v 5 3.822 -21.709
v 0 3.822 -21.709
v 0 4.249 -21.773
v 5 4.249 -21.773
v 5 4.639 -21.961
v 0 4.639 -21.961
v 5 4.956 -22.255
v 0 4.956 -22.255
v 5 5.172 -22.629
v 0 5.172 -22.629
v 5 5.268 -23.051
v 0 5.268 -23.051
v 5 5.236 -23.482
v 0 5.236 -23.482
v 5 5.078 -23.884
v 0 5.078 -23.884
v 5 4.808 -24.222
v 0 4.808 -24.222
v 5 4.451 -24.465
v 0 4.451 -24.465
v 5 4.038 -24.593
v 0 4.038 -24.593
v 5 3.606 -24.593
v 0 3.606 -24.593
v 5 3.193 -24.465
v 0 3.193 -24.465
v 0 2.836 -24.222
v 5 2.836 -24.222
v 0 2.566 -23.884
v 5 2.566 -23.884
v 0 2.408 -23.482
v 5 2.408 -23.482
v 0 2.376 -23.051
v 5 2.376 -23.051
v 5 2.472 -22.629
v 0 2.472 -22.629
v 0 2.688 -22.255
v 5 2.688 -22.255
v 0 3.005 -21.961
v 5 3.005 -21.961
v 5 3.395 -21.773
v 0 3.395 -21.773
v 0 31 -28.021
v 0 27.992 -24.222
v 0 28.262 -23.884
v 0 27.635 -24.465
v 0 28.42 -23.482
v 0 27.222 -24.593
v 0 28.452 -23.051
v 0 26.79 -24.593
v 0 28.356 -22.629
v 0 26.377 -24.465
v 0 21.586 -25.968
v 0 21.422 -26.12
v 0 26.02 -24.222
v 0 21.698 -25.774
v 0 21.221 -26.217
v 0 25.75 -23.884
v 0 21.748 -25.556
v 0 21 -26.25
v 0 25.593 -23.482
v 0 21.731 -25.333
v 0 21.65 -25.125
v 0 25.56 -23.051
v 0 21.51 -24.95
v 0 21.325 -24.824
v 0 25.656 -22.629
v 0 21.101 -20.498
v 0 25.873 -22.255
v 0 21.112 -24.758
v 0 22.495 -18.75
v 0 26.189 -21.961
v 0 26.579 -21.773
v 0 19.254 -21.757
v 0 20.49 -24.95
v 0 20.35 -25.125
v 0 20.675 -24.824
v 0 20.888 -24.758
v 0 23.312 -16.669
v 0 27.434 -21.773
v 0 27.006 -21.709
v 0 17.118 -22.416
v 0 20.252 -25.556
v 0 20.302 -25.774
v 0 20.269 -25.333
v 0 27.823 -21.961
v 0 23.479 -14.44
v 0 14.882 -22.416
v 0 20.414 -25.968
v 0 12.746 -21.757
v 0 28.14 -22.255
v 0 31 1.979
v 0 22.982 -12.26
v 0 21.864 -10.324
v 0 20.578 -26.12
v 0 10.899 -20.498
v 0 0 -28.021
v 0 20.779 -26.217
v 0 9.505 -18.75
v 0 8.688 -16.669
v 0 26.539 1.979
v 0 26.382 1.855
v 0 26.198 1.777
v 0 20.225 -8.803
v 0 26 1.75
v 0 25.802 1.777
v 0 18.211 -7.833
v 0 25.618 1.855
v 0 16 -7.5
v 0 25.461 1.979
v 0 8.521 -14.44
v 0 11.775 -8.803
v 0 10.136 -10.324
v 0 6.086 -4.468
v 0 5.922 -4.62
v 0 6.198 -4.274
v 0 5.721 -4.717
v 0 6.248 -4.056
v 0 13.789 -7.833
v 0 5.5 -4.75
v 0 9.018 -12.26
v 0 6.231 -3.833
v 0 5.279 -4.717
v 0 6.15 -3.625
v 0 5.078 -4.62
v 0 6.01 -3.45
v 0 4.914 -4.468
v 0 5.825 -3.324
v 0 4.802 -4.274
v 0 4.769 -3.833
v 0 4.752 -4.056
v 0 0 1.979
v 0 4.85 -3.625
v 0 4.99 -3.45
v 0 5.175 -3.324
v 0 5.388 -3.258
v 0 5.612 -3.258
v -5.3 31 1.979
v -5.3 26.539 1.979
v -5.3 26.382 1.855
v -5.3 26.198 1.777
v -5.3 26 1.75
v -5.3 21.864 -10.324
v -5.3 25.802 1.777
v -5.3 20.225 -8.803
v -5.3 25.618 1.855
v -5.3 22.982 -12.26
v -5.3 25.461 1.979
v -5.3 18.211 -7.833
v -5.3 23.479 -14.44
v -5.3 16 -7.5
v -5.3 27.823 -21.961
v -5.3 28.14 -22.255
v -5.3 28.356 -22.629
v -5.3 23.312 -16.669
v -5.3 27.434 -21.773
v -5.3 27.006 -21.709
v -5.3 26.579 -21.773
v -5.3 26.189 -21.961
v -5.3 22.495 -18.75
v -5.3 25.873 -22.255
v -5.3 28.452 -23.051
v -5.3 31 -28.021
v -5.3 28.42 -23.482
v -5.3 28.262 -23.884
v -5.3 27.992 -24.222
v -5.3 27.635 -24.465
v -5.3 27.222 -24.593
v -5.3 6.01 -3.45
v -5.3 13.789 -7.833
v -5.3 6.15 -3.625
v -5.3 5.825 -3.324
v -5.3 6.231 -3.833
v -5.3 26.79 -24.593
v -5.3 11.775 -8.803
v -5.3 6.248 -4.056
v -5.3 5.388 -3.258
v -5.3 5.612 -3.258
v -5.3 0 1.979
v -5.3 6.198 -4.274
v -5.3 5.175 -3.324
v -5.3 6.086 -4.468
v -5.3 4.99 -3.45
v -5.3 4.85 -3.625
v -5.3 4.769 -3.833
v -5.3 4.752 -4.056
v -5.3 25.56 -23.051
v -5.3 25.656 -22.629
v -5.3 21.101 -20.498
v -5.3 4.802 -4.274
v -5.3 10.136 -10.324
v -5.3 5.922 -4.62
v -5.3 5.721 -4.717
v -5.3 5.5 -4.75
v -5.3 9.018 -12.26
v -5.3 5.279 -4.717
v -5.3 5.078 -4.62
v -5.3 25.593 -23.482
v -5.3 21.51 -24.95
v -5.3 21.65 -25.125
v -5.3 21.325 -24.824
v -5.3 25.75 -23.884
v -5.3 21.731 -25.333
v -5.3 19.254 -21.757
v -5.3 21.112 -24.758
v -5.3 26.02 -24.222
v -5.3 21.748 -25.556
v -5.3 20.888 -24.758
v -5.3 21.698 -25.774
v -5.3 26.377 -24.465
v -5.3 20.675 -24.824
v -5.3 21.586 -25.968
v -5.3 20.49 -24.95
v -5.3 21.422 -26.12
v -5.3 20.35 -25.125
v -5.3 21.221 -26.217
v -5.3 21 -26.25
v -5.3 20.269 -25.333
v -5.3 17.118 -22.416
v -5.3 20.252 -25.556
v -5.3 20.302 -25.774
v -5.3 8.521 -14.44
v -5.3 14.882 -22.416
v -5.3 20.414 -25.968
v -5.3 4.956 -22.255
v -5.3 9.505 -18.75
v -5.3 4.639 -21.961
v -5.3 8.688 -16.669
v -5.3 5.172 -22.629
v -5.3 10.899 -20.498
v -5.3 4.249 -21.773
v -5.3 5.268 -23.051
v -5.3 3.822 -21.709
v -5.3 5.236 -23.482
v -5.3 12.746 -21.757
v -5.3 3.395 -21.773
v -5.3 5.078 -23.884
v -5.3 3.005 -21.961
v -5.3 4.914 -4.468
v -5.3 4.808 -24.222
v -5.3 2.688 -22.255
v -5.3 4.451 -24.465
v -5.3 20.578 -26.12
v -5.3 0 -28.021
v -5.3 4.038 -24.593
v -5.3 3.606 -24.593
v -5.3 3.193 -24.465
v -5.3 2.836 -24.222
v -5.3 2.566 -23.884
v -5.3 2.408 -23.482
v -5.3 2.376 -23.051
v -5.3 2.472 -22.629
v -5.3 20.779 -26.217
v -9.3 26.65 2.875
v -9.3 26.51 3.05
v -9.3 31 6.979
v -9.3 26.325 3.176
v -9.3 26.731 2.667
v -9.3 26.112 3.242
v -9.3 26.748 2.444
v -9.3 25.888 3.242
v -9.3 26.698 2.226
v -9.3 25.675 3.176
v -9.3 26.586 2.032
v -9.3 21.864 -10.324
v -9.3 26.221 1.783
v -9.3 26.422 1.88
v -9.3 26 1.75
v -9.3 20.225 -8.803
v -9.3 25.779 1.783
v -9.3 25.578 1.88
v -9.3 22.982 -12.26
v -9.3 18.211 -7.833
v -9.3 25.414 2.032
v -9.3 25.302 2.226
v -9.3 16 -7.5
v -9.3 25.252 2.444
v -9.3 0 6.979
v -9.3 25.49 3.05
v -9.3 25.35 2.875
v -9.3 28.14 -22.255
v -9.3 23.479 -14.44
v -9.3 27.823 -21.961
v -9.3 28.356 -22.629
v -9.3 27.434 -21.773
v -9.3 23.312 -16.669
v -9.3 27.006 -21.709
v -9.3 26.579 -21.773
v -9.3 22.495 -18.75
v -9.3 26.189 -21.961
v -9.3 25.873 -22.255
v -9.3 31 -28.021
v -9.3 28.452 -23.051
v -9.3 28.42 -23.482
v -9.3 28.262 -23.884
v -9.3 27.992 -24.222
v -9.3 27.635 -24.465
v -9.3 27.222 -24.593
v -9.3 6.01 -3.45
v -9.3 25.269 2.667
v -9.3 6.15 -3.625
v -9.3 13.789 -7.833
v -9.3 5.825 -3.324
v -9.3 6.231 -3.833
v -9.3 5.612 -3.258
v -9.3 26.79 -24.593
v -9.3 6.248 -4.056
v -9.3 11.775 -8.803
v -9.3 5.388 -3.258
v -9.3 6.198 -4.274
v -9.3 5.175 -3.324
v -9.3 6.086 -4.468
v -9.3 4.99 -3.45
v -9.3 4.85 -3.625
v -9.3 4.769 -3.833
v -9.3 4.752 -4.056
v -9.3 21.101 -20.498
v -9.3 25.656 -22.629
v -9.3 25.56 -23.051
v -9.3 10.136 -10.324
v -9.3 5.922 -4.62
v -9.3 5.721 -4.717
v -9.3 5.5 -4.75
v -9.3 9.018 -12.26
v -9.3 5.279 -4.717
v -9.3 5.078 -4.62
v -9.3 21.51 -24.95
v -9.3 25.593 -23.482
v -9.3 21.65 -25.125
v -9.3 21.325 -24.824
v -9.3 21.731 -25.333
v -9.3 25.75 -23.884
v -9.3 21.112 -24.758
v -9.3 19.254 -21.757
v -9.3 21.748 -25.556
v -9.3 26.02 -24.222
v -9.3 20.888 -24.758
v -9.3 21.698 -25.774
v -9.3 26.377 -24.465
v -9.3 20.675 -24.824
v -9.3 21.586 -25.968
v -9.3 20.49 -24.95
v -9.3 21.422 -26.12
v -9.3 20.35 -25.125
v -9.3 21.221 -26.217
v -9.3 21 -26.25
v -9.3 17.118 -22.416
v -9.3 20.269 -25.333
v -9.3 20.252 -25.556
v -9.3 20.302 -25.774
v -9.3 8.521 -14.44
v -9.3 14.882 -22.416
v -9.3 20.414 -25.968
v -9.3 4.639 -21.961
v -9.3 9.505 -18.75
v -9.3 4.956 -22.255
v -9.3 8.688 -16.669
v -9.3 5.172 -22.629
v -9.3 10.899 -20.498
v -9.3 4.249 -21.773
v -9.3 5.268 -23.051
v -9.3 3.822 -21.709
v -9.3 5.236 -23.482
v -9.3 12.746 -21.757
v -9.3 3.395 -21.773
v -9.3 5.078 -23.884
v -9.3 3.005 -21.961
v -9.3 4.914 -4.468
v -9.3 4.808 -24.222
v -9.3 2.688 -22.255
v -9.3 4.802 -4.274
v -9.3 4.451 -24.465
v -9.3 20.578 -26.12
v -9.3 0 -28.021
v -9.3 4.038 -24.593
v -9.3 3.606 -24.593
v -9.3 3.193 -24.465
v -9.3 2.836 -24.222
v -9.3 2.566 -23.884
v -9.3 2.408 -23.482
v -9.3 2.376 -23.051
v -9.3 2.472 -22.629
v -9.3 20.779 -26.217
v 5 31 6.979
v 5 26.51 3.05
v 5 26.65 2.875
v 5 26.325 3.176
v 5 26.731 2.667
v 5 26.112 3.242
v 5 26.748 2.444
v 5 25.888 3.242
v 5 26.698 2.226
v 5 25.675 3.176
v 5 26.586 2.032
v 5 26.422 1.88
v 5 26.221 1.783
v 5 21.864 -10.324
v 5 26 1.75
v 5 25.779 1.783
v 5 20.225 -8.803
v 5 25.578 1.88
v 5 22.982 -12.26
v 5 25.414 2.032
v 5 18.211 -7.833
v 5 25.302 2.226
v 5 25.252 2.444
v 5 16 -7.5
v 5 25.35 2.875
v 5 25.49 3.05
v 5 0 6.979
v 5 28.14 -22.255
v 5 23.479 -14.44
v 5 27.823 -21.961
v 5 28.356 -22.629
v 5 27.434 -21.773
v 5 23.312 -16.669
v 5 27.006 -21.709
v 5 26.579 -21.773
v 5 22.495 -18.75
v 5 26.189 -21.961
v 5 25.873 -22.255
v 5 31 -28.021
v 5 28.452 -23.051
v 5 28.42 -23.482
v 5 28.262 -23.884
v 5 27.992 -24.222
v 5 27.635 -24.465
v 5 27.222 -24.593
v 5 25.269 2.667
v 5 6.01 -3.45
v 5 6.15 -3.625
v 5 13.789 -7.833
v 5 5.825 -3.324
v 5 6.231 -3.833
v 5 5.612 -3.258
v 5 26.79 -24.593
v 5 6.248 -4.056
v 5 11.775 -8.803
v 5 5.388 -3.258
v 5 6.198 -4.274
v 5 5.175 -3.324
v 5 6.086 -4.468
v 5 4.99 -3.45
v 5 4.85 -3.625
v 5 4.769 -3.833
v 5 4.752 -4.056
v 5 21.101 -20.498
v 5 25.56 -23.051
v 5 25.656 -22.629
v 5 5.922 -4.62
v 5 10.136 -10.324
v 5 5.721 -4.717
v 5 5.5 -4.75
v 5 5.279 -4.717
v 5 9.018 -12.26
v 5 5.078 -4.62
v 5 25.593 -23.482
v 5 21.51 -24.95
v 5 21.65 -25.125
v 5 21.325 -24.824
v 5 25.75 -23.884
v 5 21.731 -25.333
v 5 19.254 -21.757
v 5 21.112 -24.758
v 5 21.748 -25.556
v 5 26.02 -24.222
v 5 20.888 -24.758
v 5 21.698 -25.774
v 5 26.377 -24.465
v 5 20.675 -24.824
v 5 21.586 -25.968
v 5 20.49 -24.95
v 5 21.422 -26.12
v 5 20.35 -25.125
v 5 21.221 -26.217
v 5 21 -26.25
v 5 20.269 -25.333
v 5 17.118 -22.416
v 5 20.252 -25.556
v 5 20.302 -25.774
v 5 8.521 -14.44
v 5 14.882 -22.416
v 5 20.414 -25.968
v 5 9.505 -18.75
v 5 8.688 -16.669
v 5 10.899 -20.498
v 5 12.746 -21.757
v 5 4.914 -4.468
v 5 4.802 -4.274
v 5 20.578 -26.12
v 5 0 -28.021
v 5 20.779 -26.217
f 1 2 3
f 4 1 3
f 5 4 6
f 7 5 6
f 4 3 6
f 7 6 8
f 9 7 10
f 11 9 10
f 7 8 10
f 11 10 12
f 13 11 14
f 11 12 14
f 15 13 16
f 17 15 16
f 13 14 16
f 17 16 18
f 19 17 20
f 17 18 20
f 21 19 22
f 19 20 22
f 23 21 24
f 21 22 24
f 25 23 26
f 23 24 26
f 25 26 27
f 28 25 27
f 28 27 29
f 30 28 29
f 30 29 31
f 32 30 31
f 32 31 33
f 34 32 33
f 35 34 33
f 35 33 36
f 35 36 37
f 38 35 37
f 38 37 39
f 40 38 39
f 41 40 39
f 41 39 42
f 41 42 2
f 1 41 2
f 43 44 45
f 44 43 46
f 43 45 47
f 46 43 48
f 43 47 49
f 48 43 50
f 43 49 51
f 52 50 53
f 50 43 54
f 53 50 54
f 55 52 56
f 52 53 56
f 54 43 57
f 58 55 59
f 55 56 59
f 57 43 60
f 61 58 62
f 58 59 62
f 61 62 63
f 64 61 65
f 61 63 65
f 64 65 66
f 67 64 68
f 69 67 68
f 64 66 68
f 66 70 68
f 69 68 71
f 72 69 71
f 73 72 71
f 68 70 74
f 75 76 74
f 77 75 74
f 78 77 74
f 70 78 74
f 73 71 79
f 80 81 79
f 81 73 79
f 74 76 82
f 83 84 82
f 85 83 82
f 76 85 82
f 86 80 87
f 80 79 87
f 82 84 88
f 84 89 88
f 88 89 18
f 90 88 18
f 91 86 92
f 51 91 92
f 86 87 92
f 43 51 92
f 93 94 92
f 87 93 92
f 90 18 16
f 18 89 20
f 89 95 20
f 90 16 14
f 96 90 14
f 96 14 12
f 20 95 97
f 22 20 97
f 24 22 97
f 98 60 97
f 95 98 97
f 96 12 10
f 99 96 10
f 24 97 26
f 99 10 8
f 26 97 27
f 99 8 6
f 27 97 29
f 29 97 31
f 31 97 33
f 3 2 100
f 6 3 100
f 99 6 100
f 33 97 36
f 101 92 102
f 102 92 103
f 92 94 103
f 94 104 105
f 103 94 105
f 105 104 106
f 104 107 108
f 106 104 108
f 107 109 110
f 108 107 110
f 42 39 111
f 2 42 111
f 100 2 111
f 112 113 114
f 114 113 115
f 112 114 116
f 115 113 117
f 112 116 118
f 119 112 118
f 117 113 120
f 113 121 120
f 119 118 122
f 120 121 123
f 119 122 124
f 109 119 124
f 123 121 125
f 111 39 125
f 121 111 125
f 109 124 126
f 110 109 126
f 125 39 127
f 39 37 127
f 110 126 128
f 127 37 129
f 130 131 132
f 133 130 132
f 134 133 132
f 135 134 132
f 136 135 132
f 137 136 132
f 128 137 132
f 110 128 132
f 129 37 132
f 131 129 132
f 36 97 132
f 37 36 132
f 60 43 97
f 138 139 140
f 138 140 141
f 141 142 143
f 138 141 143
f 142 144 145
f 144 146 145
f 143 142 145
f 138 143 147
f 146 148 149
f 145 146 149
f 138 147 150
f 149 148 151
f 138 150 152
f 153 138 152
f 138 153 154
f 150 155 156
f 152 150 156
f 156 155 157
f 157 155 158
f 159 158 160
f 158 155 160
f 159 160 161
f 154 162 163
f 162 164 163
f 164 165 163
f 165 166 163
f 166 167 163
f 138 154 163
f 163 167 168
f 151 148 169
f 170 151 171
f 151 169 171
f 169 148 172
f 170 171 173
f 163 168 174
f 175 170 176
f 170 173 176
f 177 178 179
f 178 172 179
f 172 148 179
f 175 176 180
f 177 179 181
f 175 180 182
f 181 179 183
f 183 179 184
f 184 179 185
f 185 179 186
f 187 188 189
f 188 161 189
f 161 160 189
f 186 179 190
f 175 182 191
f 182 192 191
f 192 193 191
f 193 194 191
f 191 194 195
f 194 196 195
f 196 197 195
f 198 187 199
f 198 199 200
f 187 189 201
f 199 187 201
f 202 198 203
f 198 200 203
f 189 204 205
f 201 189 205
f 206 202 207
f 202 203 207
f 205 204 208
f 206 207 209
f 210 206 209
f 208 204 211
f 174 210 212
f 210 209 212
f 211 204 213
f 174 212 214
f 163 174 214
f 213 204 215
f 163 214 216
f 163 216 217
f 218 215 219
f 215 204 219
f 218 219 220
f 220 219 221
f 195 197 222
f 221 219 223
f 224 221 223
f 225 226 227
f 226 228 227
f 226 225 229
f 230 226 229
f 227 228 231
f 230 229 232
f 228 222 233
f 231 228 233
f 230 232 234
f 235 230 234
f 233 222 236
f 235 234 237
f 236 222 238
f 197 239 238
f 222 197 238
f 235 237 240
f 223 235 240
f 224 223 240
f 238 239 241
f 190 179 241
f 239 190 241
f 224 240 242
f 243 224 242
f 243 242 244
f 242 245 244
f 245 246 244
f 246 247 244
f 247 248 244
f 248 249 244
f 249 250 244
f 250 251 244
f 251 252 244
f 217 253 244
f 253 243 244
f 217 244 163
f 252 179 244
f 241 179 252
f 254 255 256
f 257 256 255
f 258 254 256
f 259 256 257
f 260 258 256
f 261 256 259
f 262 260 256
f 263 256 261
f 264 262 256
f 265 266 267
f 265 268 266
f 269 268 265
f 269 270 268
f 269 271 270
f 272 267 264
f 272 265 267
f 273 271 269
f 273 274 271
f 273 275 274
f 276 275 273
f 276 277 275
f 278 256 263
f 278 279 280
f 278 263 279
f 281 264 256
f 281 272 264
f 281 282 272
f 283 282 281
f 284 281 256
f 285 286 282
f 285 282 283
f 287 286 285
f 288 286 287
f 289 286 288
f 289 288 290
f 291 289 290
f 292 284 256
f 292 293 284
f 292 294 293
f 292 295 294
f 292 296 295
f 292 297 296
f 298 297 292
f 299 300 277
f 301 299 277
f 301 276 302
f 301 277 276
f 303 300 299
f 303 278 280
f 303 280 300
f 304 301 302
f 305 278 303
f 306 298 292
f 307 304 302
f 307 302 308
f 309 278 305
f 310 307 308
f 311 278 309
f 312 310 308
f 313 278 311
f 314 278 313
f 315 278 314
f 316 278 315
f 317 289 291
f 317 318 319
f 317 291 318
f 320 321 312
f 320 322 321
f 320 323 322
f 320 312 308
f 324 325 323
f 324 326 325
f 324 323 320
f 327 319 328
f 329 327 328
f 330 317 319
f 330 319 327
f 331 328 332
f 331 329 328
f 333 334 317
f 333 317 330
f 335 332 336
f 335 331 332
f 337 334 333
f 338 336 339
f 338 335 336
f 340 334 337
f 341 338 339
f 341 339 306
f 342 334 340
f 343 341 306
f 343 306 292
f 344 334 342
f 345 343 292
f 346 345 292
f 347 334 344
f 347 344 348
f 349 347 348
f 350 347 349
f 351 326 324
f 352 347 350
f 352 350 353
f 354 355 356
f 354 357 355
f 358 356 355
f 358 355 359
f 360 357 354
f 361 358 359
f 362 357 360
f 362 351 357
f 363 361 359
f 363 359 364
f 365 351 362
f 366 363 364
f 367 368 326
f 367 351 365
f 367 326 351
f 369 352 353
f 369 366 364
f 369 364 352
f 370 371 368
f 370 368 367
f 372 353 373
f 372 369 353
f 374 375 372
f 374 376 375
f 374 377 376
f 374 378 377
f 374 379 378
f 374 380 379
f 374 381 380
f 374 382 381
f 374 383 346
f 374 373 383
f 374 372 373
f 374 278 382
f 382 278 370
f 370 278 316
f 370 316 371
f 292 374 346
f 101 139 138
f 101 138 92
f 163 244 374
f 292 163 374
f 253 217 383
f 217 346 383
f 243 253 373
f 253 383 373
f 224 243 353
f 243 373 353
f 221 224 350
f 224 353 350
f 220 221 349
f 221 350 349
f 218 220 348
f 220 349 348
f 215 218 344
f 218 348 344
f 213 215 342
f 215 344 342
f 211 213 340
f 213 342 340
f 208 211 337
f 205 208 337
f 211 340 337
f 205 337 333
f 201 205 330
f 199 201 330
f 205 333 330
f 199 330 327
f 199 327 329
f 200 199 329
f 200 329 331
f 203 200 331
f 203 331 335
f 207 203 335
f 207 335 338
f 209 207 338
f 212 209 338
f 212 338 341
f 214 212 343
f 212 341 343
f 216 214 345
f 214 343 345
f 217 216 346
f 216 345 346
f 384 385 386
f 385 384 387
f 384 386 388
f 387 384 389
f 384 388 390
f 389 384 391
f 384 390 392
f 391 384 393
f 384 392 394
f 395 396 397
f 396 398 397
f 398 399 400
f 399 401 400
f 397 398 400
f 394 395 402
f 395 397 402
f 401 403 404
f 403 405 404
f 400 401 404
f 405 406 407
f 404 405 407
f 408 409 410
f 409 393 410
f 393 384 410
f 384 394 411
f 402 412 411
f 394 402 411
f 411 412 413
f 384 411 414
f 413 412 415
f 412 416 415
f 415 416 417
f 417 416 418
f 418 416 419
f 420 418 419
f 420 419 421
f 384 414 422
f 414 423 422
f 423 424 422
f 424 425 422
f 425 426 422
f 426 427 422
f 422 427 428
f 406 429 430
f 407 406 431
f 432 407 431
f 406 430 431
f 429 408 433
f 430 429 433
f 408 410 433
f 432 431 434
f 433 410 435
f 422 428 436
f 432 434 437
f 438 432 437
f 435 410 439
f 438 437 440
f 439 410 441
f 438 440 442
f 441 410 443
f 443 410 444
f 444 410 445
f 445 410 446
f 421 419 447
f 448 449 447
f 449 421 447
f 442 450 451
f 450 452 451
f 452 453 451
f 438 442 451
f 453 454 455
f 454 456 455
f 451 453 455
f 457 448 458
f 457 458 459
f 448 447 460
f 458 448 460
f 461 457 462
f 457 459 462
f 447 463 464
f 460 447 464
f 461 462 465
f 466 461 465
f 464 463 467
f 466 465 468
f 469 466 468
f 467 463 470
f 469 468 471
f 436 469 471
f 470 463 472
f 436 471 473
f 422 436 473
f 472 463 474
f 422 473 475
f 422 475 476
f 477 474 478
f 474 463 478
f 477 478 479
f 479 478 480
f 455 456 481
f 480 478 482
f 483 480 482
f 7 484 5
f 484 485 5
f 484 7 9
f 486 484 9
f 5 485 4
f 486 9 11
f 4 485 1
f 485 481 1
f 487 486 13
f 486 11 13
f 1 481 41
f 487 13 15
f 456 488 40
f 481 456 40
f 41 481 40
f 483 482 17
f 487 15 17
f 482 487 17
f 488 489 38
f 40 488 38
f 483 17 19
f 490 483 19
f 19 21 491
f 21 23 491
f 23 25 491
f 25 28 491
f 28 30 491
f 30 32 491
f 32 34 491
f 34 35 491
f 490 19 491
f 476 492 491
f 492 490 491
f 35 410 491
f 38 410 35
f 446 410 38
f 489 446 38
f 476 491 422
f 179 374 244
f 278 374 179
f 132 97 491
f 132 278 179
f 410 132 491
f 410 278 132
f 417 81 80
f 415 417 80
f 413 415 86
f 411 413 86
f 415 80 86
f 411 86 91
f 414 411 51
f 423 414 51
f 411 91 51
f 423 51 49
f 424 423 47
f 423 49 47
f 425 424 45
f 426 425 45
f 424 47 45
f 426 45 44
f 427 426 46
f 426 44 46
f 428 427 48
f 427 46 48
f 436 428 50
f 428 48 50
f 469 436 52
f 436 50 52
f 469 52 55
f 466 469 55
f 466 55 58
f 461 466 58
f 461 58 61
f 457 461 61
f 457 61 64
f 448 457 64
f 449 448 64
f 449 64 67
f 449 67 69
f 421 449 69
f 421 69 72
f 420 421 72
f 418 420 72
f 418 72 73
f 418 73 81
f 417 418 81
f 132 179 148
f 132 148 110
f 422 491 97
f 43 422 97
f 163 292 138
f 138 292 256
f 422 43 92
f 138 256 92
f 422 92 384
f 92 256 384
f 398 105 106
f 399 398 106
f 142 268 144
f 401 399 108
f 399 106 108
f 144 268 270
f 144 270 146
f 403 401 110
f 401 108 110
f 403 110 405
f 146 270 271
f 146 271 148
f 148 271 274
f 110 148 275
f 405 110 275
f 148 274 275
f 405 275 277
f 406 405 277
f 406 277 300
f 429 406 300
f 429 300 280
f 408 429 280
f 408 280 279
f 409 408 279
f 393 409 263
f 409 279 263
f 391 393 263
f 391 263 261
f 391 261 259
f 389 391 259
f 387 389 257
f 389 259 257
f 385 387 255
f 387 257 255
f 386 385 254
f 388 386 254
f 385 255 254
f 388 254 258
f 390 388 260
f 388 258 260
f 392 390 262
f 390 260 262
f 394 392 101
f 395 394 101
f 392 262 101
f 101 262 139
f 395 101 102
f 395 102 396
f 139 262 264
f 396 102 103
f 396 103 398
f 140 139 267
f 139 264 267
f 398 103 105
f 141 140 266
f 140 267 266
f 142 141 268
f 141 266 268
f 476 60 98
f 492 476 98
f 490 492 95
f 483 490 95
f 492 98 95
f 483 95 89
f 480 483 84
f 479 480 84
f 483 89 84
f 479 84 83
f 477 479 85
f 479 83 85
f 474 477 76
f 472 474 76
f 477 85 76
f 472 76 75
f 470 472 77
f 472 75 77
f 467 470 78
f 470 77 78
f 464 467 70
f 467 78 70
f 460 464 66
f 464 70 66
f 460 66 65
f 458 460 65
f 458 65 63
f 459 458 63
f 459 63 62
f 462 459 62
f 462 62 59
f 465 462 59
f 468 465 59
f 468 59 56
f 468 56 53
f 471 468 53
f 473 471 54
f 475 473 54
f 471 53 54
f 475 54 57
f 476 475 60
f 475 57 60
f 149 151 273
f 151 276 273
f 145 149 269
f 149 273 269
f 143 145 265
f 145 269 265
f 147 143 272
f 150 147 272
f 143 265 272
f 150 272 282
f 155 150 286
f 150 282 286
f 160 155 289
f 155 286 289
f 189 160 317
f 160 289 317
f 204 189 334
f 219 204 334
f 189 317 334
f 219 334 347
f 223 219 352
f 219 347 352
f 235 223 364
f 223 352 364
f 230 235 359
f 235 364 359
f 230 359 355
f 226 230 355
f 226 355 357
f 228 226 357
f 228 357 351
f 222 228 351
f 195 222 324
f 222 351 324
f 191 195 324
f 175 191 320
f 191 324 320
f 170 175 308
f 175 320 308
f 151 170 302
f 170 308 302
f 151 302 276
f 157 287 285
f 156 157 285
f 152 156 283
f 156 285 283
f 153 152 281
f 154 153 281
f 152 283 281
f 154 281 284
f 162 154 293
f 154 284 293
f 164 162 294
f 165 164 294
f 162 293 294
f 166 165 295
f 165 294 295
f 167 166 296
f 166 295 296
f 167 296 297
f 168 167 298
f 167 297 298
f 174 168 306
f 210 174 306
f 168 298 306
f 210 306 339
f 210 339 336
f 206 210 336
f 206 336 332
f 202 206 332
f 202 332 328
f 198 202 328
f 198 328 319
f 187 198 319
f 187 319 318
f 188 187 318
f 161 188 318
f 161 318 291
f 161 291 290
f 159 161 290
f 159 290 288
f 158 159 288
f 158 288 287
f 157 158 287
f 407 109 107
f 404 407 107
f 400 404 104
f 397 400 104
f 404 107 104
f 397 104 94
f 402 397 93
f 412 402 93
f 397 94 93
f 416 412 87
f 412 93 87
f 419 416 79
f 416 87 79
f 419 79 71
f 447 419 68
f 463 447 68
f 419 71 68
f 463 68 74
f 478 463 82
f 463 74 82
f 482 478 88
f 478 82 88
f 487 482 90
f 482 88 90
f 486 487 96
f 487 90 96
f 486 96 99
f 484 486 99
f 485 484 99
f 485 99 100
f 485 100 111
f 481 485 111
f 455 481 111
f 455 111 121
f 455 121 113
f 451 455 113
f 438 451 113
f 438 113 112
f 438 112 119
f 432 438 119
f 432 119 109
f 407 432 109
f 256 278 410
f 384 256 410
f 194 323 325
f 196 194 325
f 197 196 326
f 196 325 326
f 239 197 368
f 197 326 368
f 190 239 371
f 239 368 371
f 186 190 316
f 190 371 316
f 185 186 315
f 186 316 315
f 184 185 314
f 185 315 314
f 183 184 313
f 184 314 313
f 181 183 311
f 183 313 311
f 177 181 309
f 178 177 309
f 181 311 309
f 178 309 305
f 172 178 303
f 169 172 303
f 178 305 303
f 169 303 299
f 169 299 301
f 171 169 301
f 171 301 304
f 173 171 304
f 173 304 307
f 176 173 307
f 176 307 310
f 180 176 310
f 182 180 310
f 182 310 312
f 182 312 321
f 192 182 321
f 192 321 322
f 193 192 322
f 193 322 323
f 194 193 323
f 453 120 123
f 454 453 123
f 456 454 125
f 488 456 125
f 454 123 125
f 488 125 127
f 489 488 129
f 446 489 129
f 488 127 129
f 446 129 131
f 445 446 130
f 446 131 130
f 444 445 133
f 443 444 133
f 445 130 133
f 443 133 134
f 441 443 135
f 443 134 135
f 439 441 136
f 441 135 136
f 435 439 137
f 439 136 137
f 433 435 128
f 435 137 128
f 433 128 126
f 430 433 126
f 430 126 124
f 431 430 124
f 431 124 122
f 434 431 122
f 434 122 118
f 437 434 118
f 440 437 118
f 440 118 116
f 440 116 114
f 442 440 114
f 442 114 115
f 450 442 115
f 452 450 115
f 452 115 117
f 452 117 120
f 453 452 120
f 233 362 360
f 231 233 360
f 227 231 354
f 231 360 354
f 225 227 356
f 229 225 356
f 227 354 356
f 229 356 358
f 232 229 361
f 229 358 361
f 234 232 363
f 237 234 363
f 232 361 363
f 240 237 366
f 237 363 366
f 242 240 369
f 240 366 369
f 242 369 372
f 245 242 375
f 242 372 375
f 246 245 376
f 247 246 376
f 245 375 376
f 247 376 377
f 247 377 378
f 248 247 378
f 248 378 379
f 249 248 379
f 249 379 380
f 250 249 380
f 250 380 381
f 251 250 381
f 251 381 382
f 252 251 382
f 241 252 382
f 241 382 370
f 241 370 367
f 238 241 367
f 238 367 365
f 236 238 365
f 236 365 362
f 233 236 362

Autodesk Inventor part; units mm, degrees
ref_plane "YZ Plane" through (0, 0, 0) normal (1, 0, 0) x (0, 1, 0)
ref_plane "XZ Plane" through (0, 0, 0) normal (0, 1, 0) x (-1, 0, 0)
ref_plane "Work Plane1" through (0, 0, -31.5) normal (0, -1, 0) x (1, 0, 0)
sketch "Sketch1" plane through (0, 0, -31.5) normal (0, -1, 0) x (1, 0, 0)
  line L0 (0, 31.5) -> (0, 0) projected
  line L1 (5, 26.9723) -> (5, 36.5) projected
  line L2 (-5, 0) -> (-5, 31.5) projected
  line L3 (0, 31.5) -> (-5, 31.5) projected
  line L4 (5, 3.4786) -> (0, 3.4786)
  line L5 (0, 3.4786) -> (0, 38.4786)
  line L6 (0, 38.4786) -> (5, 38.4786)
  line L7 (5, 38.4786) -> (5, 3.4786)
  line L8 (0, 38.4786) -> (-9.3, 38.4786)
  line L9 (-9.3, 38.4786) -> (-9.3, 33.4786)
  line L10 (-9.3, 33.4786) -> (0, 33.4786)
  line L11 (0, 33.4786) -> (0, 38.4786)
  line L12 (-5.3, 3.4786) -> (-9.3, 3.4786)
  line L13 (-9.3, 3.4786) -> (-9.3, 33.4786)
  line L14 (-9.3, 33.4786) -> (-5.3, 33.4786)
  line L15 (-5.3, 33.4786) -> (-5.3, 3.4786)
  dimension "d0" = 35
  dimension "d1" = 5
  dimension "d2" = 4
  dimension "d3" = 0
  dimension "d4" = 0.3
  dimension "d5" = 0
ref_plane "Work Plane2" through (-5, 31, -22.5) normal (0, 1, 0) x (0, 0, 1)
extrude "Extrusion1" add sketch "Sketch1" against normal up to surface (31 mm away)
sketch "Sketch2" plane through (-9.3, 0, -28.0214) normal (-1, 0, 0) x (0, 0, 1)
  arc A0 (11.8709, 3.8471) -> (24.1214, 10.9199) centre (13.0214, 16) ccw projected
  line L0 (11.8709, 3.8471) -> (3.0166, 8.9591) projected
  arc A1 (3.0166, 23.0409) -> (3.0166, 8.9591) centre (13.0214, 16) ccw projected
  line L1 (3.0166, 23.0409) -> (11.5786, 27.9842) projected
  arc A2 (24.1214, 20.7426) -> (11.5786, 27.9842) centre (13.0214, 16) ccw projected
  line L2 (24.1214, 20.7426) -> (24.1214, 10.9199) projected
  line L3 (-3.4786, 32) -> (-3.4786, -6) projected
  line L4 (-3.4786, -6) -> (28.0214, -6) projected
  line L5 (28.0214, -6) -> (28.0214, 32) projected
  line L6 (-3.4786, 32) -> (28.0214, 32) projected
  circle A3 centre (13.0214, 16) radius 7.5
  point P0 (28.0214, 0)
  dimension "d8" = 15
extrude "Extrusion2" cut sketch "Sketch2" against normal through all contours A3
sketch "Sketch3" plane through (5, 0, 6.9786) normal (1, 0, 0) x (0, 0, -1)
  arc A0 (6.1231, 27.7) -> (5.1231, 28.7) centre (5.1231, 27.7) ccw projected
  line L0 (5.1231, 28.7) -> (1.9786, 28.7) projected
  line L1 (1.9786, 28.7) -> (1.9786, 3) projected
  line L2 (1.9786, 3) -> (11.5063, 3) projected
  arc A1 (11.5063, 3) -> (12.5063, 4) centre (11.5063, 4) ccw projected
  line L3 (12.5063, 4) -> (12.5063, 5.8624) projected
  arc A2 (13.5063, 6.8624) -> (12.5063, 5.8624) centre (13.5063, 5.8624) ccw projected
  line L4 (13.5063, 6.8624) -> (31.9786, 6.8624) projected
  line L5 (31.9786, 6.8624) -> (31.9786, 18.397) projected
  arc A3 (32.9786, 19.397) -> (31.9786, 18.397) centre (32.9786, 18.397) ccw projected
  line L6 (32.9786, 19.397) -> (33.9786, 19.397) projected
  arc A4 (33.9786, 19.397) -> (34.9786, 20.397) centre (33.9786, 20.397) ccw projected
  line L7 (34.9786, 20.397) -> (34.9786, 22.9624) projected
  arc A5 (34.9786, 22.9624) -> (33.9786, 23.9624) centre (33.9786, 22.9624) ccw projected
  line L8 (33.9786, 23.9624) -> (7.1231, 23.9624) projected
  arc A6 (6.1231, 24.9624) -> (7.1231, 23.9624) centre (7.1231, 24.9624) ccw projected
  line L9 (6.1231, 24.9624) -> (6.1231, 27.7) projected
  line L10 (14.4786, 22) -> (29.9786, 22) projected
  line L11 (29.9786, 22) -> (29.9786, 8.5) projected
  line L12 (29.9786, 8.5) -> (14.4786, 8.5) projected
  line L13 (14.4786, 8.5) -> (14.4786, 22) projected
  circle A7 centre (4.4786, 26) radius 1 projected
  circle A8 centre (10.9786, 5.5) radius 1 projected
  circle A9 centre (32.4786, 21) radius 1 projected
  point P0 (6.9786, 0)
hole "Hole1" at (5, 5.5, -4) at (5, 26, 2.5) at (5, 21, -25.5) direction (-1, 0, 0) diameter 1.5 end through all
sketch "Sketch4" plane through (-9.3, 0, -28.0214) normal (-1, 0, 0) x (0, 0, 1)
  circle A0 centre (30.5214, 26) radius 0.75 projected
  circle A1 centre (24.0214, 5.5) radius 0.75 projected
  circle A2 centre (2.5214, 21) radius 0.75 projected
  circle A3 centre (13.0214, 16) radius 7.5 projected
  line L0 (35, 31) -> (0, 31) projected
  line L1 (0, 0) -> (0, 31) projected
  line L2 (35, 0) -> (0, 0) projected
  line L3 (35, 0) -> (35, 31) projected
  circle A4 centre (4.8624, 3.8221) radius 1.45
  circle A5 centre (4.8624, 27.0062) radius 1.45
  point P0 (28.0214, 0)
  dimension "d18" = 2.9
  dimension "d19" = 2.9
extrude "Extrusion3" cut sketch "Sketch4" against normal through all contours A4 | A5
properties part number "cellSTORM_inverted_spacerblock_KES400"
